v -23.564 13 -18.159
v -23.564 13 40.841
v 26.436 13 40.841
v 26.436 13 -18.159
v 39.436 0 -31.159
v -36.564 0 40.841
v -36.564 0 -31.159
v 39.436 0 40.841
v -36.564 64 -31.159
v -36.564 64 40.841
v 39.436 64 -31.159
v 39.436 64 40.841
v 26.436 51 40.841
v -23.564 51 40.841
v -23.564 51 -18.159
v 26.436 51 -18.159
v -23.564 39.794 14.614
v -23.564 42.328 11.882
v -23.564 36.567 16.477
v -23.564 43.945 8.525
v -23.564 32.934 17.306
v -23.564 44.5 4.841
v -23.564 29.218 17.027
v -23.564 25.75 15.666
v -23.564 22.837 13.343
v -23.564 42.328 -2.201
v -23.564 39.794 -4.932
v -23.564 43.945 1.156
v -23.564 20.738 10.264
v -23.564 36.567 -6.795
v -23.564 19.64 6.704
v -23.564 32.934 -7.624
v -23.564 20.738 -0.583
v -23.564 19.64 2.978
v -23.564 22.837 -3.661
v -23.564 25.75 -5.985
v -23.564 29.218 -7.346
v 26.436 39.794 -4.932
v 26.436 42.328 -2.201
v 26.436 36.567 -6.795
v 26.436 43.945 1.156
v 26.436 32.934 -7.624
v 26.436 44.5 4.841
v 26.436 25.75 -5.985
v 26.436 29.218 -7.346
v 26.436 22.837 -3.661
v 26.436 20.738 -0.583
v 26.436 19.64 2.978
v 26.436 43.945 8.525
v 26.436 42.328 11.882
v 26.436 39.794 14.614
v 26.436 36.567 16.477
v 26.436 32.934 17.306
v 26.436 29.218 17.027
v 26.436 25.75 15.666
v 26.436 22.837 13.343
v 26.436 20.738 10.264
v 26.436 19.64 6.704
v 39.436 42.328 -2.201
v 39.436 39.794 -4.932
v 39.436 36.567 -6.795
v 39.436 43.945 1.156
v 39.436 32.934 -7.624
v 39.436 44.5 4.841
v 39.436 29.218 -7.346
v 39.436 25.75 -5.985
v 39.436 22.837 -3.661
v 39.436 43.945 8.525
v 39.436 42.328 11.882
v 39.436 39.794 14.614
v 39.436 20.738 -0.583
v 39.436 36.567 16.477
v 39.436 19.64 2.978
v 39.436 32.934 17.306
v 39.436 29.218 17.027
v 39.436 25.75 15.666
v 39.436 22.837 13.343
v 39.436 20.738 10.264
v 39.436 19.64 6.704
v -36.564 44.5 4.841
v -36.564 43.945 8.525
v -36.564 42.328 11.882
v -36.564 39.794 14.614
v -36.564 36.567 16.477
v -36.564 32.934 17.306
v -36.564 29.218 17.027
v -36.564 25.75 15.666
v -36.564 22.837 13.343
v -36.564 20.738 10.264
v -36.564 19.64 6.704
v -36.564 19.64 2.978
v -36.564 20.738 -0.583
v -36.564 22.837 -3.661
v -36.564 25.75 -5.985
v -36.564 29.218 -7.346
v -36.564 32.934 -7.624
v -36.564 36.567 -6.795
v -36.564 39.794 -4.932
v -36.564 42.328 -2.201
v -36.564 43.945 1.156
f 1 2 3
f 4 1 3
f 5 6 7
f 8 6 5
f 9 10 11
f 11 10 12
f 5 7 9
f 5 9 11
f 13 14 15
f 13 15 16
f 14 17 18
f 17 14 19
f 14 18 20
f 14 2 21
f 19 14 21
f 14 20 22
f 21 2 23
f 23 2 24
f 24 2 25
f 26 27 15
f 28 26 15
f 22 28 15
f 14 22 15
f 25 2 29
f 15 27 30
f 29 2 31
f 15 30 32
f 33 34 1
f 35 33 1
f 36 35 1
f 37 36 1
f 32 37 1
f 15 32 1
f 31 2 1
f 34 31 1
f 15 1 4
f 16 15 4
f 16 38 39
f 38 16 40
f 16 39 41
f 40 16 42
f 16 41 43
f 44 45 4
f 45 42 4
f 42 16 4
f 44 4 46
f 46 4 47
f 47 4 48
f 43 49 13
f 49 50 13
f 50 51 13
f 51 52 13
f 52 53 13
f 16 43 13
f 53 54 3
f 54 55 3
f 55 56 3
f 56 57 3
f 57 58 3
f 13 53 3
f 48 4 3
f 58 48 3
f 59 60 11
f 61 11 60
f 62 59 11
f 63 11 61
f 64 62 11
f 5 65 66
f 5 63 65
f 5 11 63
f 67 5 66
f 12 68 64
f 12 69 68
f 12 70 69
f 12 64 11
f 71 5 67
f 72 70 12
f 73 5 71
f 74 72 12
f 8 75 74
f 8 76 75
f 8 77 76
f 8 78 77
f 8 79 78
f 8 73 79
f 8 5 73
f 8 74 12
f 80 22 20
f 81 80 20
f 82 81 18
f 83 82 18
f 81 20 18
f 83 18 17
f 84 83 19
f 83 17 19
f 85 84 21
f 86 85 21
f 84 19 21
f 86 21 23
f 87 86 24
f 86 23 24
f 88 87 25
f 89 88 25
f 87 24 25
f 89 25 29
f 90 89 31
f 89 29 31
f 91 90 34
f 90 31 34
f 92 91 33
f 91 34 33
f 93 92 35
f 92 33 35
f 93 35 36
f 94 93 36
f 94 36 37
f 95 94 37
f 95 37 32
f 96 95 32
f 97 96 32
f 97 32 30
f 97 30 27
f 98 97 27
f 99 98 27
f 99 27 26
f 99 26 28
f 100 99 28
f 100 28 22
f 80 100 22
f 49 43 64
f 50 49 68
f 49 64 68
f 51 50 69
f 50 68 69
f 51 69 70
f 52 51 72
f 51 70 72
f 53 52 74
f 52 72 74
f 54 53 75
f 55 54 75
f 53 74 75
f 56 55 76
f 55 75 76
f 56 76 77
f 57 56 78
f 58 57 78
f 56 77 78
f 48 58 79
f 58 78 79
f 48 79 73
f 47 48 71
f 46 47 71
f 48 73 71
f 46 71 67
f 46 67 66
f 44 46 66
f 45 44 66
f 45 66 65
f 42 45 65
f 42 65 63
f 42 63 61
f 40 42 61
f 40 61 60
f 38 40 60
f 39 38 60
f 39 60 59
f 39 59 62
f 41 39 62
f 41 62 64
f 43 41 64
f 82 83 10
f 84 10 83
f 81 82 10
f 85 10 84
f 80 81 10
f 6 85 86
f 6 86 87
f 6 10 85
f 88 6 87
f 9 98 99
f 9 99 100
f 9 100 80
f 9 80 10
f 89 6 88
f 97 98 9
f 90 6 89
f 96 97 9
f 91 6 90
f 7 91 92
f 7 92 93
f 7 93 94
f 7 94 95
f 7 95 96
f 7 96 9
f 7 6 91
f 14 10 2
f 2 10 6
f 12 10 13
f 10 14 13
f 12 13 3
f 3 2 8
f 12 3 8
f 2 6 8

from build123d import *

# Parameters (mm, degrees)
F0_W     = 76
F0_H     = 54
F0_H_2   = 18
F1_DEPTH = 64
F2_T     = -13
F3_R     = 12.5
F4_DEPTH = 103.3


with BuildPart() as f1:
    # F0 (on Front) → F1 (new body)
    with BuildSketch(Plane.XZ):
        with Locations((1.435856, 13.840802)):
            Rectangle(F0_W, F0_H)
        with Locations((1.435856, -22.159198)):
            Rectangle(F0_W, F0_H_2)
    extrude(amount=-F1_DEPTH)

    # F2
    f2_openings = [f1.faces().sort_by_distance(p)[0] for p in [
        (1.435856, 32, 40.840802),
    ]]
    offset(amount=F2_T, openings=f2_openings)

    # F3 (on face) → F4 (cut)
    with BuildSketch(Plane.YZ.offset(39.435856)):
        with Locations((32, 4.840802)):
            Circle(F3_R)
    extrude(amount=-F4_DEPTH, mode=Mode.SUBTRACT)


solid = f1.part
